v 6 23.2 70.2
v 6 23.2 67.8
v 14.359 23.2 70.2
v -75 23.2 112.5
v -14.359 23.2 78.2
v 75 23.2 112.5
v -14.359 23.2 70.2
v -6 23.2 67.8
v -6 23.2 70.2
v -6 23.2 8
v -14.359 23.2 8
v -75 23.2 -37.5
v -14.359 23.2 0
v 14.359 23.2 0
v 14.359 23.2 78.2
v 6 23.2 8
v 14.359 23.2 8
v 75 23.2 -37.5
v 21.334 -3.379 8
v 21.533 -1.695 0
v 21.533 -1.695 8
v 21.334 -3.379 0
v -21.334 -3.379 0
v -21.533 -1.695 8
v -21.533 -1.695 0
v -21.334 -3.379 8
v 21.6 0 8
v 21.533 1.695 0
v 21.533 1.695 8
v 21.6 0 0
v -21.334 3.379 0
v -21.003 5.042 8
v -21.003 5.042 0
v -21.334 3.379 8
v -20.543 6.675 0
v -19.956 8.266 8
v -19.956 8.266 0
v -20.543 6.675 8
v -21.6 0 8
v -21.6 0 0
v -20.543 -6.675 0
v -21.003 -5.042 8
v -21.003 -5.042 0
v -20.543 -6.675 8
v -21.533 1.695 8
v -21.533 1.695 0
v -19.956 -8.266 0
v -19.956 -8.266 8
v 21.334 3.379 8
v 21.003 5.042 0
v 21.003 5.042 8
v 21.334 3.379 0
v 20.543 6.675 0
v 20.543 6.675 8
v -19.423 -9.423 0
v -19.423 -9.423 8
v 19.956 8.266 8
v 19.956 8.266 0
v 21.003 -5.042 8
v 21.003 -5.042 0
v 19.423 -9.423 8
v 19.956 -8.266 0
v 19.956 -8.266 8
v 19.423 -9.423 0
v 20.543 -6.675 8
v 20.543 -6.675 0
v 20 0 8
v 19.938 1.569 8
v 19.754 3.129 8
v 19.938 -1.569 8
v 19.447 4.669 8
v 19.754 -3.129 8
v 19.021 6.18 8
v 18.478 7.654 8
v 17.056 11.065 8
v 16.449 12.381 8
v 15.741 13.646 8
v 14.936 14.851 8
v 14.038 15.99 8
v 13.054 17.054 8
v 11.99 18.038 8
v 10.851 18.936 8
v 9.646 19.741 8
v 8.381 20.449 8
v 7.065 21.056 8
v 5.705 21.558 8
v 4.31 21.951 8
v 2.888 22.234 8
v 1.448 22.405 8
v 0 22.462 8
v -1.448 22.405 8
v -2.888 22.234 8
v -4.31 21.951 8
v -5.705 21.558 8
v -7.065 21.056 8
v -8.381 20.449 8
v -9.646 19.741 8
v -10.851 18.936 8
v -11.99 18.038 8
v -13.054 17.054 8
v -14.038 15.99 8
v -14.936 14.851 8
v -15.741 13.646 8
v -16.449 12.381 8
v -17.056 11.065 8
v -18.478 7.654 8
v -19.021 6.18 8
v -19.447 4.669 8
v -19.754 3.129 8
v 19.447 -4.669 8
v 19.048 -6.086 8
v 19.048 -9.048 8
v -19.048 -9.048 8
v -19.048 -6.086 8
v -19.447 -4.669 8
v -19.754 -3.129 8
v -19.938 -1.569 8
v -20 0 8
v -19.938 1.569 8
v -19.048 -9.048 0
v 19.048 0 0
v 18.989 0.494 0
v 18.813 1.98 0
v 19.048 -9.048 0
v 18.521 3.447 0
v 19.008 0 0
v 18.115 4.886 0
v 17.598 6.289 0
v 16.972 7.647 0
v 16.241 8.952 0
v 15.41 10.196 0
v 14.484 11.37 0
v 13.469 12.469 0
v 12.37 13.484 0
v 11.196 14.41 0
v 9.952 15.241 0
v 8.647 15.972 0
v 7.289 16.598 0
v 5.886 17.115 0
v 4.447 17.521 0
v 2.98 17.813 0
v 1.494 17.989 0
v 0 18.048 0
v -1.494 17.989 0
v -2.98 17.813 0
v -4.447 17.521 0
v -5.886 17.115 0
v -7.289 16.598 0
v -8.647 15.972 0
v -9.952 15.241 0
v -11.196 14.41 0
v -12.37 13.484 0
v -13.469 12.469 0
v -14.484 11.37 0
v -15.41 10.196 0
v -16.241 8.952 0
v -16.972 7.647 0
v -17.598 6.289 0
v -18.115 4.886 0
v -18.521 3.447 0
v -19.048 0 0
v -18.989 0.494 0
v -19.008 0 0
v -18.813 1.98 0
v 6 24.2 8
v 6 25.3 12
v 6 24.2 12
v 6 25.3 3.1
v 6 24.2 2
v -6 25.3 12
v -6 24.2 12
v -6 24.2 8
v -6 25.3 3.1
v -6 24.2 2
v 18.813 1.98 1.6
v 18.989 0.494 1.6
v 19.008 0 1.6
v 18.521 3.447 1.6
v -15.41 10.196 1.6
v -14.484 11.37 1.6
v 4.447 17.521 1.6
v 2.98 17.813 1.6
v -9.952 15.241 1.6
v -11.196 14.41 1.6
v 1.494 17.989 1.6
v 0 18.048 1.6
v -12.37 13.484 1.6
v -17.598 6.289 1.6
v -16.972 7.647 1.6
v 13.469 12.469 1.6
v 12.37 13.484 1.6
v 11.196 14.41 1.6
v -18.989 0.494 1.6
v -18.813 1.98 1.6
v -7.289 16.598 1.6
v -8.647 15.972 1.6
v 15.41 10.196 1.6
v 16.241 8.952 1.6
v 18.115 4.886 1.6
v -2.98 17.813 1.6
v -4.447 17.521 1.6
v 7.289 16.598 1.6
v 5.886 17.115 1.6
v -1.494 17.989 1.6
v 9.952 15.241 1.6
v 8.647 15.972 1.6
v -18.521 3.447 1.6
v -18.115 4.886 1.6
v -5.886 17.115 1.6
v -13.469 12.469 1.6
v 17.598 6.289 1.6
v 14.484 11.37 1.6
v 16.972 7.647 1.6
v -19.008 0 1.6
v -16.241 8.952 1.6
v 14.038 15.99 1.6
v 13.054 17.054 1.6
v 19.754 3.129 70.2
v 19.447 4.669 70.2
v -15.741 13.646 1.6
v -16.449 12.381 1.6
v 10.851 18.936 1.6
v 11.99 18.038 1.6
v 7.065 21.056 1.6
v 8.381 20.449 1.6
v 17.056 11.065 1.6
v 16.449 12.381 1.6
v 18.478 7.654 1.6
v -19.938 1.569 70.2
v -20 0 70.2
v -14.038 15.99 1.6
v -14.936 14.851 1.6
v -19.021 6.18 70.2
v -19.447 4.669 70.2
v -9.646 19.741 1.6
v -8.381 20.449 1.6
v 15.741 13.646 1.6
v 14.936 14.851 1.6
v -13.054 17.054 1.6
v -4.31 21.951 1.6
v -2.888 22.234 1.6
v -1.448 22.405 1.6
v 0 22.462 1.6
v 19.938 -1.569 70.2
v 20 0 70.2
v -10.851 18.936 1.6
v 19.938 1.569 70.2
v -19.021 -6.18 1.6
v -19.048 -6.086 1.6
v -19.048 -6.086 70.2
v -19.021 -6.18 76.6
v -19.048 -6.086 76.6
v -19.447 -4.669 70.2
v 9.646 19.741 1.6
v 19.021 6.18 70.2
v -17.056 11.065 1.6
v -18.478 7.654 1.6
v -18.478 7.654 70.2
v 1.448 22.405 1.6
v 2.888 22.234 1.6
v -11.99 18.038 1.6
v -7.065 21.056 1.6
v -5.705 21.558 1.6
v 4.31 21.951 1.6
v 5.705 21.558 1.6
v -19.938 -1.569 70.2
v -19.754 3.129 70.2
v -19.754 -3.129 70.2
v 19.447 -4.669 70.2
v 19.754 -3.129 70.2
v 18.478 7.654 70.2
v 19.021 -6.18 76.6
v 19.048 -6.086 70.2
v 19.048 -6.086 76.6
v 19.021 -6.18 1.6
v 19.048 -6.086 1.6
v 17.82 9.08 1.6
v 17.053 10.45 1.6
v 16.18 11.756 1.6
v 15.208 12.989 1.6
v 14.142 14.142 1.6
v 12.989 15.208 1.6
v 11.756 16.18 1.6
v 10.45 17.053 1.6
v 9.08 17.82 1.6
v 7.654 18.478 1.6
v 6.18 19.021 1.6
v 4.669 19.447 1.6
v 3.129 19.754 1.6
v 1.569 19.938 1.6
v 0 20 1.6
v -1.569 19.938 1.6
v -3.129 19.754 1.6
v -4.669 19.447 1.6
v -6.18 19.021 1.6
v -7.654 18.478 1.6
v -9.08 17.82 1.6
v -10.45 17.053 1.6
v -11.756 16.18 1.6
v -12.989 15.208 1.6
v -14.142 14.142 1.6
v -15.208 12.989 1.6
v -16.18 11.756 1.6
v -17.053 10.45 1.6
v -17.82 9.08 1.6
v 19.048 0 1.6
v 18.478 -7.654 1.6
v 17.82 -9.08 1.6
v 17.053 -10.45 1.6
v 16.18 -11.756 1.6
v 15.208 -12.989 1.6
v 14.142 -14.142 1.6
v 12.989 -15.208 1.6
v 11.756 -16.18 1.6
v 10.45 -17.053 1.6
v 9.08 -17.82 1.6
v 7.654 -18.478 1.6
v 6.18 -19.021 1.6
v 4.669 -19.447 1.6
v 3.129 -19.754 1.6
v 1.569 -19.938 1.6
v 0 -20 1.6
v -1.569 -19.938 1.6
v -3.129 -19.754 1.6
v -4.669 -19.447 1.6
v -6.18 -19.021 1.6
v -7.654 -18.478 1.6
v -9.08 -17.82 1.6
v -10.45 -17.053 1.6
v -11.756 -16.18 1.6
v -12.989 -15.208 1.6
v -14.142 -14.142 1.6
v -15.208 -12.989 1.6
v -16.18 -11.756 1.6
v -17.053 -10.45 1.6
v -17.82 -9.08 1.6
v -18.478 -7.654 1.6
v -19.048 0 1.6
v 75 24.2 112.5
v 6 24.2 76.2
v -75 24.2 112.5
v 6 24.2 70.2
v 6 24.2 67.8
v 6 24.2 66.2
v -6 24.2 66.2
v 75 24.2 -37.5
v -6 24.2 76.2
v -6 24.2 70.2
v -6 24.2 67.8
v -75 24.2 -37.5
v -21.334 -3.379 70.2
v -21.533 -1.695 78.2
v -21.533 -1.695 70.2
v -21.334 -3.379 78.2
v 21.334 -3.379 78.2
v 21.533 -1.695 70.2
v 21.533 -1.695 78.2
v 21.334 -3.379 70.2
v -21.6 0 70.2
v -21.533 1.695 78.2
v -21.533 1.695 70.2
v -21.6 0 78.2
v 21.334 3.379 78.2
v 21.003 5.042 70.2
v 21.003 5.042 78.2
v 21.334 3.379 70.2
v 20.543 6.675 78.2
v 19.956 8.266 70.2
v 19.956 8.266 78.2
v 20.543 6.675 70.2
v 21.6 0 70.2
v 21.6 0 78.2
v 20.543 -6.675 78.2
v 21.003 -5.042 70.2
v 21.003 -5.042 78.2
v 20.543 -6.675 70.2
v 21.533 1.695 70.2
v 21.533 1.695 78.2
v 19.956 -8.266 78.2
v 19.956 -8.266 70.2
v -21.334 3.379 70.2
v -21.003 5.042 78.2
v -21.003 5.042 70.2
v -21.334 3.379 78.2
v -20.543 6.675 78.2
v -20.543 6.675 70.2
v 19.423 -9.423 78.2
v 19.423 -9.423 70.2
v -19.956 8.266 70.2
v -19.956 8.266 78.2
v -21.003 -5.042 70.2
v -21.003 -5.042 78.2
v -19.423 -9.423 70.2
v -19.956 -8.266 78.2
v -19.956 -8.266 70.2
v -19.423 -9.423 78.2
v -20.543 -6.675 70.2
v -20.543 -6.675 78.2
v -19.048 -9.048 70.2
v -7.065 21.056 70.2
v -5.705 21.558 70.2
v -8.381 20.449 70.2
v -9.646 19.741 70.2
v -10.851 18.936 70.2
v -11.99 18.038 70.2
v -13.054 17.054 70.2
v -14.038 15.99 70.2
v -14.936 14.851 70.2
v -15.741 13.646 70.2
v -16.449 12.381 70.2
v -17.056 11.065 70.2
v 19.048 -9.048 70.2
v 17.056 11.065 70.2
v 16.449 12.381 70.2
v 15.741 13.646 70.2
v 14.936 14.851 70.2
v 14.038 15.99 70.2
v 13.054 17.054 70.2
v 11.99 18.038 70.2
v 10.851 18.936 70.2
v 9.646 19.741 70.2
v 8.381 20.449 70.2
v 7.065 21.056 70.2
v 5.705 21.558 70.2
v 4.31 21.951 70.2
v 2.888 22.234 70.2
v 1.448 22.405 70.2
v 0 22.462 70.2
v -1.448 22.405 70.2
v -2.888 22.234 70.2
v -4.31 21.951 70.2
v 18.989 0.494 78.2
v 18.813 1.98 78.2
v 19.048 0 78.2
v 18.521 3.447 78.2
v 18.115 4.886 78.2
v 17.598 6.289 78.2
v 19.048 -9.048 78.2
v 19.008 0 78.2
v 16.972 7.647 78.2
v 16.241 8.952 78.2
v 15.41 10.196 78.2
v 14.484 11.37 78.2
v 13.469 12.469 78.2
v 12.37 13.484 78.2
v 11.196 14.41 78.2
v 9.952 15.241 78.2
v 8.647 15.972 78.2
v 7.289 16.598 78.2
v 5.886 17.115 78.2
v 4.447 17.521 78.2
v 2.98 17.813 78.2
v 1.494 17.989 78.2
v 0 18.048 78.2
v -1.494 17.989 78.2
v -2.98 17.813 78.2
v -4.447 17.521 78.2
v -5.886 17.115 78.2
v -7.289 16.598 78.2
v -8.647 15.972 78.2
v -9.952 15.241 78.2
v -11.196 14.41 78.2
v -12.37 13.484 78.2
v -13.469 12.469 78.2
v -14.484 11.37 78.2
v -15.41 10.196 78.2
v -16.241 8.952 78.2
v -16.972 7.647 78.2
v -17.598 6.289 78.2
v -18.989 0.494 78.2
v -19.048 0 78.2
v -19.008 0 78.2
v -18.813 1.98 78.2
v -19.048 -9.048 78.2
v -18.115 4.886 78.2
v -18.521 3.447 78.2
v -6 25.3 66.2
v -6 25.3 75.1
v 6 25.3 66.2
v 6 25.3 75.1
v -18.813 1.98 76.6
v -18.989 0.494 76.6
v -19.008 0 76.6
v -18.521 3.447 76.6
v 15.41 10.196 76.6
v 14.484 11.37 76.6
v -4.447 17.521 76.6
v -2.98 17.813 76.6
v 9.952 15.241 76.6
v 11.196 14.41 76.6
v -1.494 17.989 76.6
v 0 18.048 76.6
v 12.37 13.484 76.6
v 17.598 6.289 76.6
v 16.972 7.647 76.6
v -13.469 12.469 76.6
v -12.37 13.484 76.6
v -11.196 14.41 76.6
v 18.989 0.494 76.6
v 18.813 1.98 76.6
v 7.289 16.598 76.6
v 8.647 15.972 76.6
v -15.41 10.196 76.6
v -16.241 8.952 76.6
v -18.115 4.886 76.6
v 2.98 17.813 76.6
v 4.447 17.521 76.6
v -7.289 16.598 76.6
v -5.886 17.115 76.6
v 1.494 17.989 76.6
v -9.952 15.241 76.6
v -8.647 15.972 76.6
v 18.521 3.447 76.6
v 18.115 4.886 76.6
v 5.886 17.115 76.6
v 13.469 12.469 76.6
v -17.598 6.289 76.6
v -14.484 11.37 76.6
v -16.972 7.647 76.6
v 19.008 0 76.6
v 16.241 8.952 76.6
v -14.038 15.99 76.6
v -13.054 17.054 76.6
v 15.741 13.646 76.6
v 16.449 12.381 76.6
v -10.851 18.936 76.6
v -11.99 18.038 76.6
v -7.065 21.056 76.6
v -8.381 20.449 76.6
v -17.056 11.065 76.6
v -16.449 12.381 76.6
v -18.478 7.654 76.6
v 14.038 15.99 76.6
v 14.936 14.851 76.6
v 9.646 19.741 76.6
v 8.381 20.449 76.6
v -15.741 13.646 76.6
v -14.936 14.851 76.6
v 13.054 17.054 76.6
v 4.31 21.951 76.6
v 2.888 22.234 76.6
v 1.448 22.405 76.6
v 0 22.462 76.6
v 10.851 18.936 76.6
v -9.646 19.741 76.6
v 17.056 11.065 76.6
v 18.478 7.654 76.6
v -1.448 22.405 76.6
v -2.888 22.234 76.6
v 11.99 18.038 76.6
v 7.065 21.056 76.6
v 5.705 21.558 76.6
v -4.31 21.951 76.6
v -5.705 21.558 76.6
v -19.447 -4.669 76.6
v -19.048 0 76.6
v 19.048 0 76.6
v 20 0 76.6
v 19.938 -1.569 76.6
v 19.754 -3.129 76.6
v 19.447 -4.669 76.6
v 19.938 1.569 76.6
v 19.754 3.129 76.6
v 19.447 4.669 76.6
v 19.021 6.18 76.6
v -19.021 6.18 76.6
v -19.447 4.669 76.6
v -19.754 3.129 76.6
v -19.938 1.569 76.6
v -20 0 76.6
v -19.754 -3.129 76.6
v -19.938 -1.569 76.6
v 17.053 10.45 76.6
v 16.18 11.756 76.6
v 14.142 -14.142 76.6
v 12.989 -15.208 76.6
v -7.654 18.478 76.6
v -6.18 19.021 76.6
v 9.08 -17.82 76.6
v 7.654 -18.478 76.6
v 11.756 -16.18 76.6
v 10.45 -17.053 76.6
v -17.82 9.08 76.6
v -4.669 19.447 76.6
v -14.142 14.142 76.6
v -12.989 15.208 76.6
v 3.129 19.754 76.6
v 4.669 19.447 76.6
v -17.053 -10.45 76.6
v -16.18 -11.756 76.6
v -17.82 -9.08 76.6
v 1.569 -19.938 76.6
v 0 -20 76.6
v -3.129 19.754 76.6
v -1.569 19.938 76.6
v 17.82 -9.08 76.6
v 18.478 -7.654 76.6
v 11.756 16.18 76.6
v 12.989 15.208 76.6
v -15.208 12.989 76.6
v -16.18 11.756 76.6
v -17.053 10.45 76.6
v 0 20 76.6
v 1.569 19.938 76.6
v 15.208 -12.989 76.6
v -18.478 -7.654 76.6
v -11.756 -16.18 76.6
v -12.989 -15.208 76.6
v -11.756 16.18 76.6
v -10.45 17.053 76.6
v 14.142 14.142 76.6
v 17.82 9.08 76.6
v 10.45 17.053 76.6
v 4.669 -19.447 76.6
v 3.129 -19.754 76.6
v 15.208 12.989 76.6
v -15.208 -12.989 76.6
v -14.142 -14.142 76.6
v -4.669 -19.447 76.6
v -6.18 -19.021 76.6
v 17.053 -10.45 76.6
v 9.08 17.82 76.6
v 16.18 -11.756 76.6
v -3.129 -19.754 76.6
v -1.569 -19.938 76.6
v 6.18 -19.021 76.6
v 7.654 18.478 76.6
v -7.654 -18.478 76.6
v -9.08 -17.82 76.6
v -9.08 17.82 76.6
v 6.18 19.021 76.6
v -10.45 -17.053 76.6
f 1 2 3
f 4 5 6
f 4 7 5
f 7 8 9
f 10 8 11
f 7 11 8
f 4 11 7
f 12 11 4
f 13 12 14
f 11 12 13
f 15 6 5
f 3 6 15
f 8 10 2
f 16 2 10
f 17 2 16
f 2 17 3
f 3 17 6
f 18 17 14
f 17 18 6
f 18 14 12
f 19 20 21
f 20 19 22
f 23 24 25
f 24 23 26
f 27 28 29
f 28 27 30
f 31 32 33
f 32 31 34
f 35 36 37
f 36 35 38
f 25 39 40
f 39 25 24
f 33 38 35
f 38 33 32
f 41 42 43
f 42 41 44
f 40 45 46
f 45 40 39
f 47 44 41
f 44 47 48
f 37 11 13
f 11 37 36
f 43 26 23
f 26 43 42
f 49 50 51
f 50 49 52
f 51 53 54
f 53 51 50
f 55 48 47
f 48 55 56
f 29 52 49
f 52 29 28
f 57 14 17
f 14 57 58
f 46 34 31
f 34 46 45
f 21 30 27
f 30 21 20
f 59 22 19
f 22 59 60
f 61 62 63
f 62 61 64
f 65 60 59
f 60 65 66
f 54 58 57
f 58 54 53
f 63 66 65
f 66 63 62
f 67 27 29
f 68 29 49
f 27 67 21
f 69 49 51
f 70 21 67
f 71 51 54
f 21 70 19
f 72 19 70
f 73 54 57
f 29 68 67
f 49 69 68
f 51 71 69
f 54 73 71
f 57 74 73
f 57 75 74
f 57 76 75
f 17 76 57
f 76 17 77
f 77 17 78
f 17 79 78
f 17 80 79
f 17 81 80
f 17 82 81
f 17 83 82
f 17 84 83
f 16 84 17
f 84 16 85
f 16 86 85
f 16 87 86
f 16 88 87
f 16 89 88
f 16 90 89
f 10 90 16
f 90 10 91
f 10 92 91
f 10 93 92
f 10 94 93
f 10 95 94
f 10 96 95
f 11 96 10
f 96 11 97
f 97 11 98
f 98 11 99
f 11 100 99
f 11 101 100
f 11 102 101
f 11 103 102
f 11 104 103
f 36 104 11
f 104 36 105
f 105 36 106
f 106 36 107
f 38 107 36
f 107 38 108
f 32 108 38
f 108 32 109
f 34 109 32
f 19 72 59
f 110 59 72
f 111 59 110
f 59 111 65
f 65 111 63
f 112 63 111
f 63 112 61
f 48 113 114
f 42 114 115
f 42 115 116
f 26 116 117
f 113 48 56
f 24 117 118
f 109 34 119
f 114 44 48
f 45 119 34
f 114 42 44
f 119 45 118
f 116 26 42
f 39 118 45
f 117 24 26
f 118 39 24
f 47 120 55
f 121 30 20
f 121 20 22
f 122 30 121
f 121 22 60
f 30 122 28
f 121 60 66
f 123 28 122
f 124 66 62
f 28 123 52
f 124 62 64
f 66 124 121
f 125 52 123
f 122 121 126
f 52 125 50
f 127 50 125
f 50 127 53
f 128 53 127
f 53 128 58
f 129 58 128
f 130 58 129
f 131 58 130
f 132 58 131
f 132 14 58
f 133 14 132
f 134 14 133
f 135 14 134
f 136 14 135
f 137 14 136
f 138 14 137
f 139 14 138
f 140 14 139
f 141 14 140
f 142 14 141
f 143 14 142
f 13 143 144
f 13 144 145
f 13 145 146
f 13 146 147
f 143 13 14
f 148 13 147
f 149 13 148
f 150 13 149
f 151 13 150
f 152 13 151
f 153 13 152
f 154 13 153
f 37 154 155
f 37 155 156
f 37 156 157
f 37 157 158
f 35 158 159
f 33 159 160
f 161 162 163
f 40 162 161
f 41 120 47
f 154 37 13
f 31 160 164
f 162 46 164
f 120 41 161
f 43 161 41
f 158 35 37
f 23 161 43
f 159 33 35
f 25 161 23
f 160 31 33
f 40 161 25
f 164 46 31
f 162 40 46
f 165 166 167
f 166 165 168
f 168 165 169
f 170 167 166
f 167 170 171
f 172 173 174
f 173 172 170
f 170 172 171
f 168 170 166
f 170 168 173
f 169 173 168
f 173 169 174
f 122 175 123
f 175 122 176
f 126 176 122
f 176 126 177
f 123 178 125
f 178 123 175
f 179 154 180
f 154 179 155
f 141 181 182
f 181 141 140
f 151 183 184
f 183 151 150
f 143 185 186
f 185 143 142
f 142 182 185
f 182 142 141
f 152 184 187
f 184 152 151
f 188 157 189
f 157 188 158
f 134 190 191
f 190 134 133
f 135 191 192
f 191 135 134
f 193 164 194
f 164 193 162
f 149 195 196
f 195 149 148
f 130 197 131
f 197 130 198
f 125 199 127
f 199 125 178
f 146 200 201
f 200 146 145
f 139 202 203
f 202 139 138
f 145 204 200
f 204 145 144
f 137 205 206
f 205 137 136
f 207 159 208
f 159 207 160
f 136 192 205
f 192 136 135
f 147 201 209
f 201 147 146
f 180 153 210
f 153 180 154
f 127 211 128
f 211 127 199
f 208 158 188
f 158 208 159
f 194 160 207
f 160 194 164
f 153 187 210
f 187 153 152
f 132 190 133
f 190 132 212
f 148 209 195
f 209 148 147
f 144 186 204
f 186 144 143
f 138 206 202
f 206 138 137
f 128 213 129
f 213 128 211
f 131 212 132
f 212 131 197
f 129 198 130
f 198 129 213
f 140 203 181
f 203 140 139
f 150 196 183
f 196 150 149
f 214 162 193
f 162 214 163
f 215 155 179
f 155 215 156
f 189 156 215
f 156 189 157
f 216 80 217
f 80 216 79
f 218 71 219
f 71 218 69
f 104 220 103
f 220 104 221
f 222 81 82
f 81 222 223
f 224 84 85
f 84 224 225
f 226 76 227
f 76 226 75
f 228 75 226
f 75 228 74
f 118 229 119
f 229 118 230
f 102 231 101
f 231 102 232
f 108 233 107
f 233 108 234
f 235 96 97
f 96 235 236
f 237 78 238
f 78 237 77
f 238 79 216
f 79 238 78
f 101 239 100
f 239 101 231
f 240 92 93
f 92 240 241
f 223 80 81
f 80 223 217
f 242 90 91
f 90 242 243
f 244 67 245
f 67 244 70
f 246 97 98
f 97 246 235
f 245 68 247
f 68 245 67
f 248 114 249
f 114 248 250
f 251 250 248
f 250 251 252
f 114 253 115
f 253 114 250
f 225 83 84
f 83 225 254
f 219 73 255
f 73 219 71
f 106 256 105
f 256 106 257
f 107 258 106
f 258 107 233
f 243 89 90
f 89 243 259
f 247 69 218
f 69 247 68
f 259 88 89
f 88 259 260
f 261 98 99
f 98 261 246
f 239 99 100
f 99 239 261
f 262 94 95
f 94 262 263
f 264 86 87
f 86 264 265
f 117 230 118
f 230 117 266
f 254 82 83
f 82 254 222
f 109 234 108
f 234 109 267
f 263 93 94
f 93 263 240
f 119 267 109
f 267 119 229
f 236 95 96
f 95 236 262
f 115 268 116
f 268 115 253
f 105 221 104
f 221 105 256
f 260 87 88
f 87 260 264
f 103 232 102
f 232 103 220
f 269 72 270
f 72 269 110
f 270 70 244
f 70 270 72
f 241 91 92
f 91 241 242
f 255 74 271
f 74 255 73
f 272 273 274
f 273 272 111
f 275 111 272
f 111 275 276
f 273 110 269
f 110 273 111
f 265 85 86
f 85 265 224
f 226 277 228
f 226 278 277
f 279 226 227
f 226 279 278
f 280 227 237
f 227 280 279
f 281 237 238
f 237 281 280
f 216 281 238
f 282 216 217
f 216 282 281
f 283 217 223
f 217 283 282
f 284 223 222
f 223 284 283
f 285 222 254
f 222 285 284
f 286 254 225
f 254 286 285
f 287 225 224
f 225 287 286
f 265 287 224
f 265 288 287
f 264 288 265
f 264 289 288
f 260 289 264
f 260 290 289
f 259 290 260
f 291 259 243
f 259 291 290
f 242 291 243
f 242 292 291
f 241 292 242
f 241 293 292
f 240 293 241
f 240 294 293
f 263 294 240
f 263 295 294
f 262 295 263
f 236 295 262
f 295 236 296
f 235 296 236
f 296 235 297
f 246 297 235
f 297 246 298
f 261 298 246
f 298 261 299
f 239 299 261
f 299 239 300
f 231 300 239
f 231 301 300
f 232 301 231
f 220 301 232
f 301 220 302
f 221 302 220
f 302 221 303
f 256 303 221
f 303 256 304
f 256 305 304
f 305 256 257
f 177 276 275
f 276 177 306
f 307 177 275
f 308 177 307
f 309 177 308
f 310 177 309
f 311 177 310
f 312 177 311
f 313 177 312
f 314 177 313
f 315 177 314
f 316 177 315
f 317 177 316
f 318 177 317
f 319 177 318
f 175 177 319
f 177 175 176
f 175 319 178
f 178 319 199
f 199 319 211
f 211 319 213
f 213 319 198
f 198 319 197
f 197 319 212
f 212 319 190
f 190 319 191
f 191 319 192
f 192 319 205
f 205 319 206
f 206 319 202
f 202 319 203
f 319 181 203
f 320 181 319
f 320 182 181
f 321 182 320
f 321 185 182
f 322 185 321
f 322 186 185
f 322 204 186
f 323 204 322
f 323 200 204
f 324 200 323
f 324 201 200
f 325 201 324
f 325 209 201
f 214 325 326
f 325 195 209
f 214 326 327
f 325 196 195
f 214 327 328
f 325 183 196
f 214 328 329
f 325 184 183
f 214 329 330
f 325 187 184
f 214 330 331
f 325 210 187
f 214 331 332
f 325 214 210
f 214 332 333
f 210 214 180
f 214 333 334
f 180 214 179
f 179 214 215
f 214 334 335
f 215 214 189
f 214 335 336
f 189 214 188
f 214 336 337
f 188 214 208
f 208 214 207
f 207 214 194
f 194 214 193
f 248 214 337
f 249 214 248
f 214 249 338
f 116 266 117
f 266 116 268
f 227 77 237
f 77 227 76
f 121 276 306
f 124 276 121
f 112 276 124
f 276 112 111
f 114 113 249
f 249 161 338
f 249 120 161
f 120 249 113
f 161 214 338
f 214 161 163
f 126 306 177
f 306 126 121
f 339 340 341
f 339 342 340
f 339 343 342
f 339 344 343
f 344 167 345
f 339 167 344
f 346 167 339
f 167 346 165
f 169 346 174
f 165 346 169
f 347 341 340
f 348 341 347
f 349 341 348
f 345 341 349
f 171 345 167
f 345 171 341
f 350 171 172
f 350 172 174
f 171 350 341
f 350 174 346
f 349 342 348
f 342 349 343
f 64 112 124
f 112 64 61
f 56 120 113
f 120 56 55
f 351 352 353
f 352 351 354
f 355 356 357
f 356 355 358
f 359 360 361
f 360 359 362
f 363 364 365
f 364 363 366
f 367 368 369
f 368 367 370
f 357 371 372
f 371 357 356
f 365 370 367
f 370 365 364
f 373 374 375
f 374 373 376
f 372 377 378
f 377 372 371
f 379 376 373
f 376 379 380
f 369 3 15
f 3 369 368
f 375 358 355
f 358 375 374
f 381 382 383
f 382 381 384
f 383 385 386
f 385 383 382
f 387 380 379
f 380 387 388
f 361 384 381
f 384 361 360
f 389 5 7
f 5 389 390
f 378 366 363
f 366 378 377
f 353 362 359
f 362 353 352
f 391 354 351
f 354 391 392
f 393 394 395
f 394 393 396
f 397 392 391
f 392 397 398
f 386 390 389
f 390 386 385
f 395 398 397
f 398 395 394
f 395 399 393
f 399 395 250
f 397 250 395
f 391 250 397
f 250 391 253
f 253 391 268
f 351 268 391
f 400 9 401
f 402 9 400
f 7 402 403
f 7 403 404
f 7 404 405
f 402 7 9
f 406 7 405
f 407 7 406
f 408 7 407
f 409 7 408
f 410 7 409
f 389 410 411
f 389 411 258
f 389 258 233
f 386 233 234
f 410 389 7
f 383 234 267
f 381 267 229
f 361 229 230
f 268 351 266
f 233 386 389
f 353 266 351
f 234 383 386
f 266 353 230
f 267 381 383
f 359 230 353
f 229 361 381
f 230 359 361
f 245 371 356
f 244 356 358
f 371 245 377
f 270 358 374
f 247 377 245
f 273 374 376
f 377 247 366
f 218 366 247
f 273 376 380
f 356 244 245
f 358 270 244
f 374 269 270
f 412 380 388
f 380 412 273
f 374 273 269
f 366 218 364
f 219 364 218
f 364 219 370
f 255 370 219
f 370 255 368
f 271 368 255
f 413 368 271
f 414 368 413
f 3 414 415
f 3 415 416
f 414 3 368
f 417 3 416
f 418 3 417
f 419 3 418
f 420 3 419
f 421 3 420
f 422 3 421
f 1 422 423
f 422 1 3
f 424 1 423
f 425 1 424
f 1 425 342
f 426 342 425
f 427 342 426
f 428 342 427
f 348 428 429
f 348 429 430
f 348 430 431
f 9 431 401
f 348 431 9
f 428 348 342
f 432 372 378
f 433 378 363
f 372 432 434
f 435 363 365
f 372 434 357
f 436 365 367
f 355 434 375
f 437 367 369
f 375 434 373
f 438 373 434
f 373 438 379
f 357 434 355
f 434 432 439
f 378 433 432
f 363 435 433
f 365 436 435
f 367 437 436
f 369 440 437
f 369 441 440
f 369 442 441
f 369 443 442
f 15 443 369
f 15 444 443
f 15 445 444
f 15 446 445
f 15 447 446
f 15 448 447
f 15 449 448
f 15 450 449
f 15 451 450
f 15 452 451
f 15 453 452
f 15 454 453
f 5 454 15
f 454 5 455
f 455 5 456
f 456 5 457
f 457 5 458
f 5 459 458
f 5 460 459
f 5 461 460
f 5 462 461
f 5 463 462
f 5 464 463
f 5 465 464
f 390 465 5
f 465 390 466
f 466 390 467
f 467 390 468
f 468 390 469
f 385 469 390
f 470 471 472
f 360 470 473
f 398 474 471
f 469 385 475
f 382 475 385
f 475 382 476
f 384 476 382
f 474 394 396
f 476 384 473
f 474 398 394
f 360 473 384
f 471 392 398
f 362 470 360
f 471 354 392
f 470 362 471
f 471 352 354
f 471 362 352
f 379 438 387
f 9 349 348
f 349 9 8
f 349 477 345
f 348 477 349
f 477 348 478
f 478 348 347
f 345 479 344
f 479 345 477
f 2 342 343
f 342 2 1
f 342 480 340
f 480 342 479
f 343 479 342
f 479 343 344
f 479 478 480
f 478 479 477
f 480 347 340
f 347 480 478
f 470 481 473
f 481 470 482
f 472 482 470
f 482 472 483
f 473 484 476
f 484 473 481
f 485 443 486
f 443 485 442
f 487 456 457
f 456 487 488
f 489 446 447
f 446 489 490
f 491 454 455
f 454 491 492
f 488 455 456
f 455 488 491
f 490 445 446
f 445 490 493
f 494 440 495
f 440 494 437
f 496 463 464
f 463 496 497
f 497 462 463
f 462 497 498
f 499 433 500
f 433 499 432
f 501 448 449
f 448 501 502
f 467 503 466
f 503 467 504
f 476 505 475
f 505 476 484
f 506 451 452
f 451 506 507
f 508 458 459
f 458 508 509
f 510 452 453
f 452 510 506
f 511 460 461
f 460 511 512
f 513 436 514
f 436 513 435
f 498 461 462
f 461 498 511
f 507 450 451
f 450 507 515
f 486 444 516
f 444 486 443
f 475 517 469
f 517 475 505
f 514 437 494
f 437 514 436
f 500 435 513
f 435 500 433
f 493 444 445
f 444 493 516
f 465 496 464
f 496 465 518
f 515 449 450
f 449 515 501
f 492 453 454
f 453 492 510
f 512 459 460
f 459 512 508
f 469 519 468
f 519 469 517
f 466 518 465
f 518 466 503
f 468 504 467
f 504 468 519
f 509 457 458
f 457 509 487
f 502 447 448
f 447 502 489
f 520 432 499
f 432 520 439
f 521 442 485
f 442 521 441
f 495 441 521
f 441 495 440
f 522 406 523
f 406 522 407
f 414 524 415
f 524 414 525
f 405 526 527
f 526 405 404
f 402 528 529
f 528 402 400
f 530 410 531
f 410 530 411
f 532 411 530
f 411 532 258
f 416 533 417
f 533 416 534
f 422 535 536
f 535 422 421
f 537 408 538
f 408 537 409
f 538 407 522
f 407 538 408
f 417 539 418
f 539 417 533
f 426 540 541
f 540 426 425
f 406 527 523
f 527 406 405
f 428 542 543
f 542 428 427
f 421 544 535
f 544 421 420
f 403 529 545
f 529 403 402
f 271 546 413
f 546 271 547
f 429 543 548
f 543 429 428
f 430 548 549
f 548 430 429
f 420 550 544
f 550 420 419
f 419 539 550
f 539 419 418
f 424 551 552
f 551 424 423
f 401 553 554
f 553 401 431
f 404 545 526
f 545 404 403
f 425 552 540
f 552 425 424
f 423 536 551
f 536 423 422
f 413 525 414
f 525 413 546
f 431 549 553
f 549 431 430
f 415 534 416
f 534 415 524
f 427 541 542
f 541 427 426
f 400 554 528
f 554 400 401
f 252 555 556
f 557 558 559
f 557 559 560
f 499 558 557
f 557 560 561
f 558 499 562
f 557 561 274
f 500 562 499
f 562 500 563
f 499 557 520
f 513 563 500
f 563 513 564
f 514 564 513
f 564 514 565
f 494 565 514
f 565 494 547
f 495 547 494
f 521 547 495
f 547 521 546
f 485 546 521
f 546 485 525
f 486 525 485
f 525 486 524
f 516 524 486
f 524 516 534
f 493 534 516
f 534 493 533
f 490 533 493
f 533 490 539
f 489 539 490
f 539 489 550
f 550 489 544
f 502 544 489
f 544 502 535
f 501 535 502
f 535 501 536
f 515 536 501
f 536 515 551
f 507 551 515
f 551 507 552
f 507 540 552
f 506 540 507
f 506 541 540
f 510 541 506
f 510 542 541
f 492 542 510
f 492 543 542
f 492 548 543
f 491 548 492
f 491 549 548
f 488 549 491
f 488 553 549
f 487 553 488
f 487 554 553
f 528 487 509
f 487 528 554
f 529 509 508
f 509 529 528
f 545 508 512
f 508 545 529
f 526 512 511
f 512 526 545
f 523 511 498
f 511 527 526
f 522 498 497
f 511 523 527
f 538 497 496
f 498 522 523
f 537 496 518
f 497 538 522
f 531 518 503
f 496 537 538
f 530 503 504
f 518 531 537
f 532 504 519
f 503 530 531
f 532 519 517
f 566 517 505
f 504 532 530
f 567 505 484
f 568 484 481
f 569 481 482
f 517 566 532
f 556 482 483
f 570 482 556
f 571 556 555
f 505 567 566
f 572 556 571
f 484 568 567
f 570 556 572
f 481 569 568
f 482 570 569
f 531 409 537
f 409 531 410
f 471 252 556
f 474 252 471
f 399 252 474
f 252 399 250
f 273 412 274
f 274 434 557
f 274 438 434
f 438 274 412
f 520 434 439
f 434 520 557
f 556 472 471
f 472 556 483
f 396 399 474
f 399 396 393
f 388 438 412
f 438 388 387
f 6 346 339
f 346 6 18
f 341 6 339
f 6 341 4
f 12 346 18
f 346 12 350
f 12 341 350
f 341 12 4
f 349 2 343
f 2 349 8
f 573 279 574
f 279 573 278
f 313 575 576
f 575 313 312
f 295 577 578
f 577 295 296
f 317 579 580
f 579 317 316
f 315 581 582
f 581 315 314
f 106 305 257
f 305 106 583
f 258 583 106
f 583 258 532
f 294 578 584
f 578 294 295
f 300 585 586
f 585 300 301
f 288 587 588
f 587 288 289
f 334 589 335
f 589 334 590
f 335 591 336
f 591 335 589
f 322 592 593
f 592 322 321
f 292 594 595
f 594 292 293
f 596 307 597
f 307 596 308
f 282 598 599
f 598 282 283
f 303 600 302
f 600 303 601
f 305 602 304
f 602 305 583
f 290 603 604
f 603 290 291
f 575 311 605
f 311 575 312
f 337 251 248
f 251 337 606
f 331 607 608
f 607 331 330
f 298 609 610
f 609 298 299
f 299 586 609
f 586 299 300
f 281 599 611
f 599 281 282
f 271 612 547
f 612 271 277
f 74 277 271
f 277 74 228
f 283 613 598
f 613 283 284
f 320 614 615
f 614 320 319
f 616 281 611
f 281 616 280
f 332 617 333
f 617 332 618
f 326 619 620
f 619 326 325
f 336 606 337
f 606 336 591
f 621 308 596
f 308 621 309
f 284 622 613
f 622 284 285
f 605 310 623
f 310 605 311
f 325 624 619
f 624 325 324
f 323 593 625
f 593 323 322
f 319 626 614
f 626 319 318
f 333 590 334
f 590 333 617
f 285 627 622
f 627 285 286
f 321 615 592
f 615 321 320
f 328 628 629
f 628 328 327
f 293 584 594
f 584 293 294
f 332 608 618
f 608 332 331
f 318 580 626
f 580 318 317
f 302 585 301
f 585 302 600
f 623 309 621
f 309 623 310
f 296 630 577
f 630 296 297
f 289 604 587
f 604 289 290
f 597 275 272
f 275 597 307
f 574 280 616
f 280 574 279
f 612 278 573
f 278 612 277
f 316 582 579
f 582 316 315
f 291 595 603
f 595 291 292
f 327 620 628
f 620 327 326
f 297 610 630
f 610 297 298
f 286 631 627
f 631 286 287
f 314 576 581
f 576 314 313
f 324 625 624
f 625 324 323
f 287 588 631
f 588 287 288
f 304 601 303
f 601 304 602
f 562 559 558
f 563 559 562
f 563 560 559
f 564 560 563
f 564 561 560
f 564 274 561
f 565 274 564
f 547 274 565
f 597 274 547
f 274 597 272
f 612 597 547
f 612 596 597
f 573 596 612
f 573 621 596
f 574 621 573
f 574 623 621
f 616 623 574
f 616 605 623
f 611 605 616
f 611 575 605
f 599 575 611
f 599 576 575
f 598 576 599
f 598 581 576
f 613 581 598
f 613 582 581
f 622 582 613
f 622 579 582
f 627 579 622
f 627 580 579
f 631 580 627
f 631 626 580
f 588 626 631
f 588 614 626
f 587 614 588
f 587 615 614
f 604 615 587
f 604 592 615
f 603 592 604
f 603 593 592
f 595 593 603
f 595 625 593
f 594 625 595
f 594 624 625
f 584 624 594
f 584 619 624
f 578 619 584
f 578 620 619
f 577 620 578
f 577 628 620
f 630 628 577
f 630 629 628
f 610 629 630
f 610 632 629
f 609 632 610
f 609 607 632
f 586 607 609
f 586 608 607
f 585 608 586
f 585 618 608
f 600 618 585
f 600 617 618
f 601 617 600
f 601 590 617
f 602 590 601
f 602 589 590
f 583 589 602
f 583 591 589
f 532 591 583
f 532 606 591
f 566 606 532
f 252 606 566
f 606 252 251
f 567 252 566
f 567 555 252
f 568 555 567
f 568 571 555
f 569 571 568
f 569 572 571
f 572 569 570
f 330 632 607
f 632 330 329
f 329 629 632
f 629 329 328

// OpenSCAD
/*

Capacitor clamp script. Based on a clamp found in a Philips 1542 power supply, coded by Atkelar in 2022. Free to use in non-commercial manners, please consider putting a bit in my Ko-Fi account over here https://ko-fi.com/atkelar if you like it! Thanks!

Two equal clamps are needed. They are going to grip the capacitor and lock it in place when put into a square hole for each.

The "show use" option will print out measurements for the hole pattern, which can be seen as such:

    +--+            +--+ <----
    |  |            |  |     |
    |  |<-distance->|  |   width
    |  |            |  |     |
    +--+            +--+ <----
    ^--^ height
*/

/* [Tab] [Sizes] */

// Outer diameter of the capacitor, in mm.
dCapacitor = 40;

// Thickness (or height) of the clamp band, in mm.
hClamp = 8;

// Width of the tab for the mounting clip. Make sure the actual hole is ever so slightly larger!
wTab = 12;

// Height of the tab (hole) for the mounting clip. Make sure the actual hole is ever so slightly larger!
hTab = 6;

// Thickness of the sheet metal that holds the clip
hSheet = 1;

// Height of the capacitor in mm. used for visualization and hole computation.abs
hCapacitor = 75;


// Show the applied use; Read debug output for hole pattern description.
showUse = true;

/* [Tab] [Tuning (advanced)] */

// Percentage to "shrink" the clamp around the capacitor to provide "springiness". Default 2.5 will cause 39mm clamp for 40mm capacitor.
pSpring = 2.5; 

// Percentage for the standard wall thickness, measured against the height of the band.
pThickness = 20;

// Percentage for the "inset" or "lip" that will hold the capacitor and prevent sliding out. Measured against the capacitor diameter.
pInset = 5;

// resolution (higher = smoother, I go with 80 usually)
$fn=80; // [20:10:100]

module Holder(dmajor, hnorm, dinset, wwall, wtab, htab, hsheet, dminor, wback)
{
    difference()
    {
        union() // raw, full outline.
        {
            hull()
            {
                cylinder(h=hnorm, d=dmajor + 2*wwall);
                translate([-wback/2,2*wwall,0])
                    cube([wback, dmajor/2, hnorm]);
            }
            translate([-wtab / 2, dmajor/2 + wwall + hsheet,hnorm-htab])
                cube([wtab, wwall + hsheet + 0.1, 10]);
        }
        translate([-wtab / 2 *1.1, dmajor / 2 + wwall*2+hsheet, hnorm-hTab])
            rotate([-45,0,0])
                cube([14,5,5]);
        translate([0,-1,-0.5])
            cylinder(d=dinset, h=hnorm+1);
        translate([0,0,wwall])
            hull()
            {
                cylinder(d=dmajor, h=hnorm+1);
                translate([0,dmajor*0.1,0])
                    cylinder(d=dminor, h=hnorm+1);
            }
        translate([-dinset/2,-dmajor / 2,-.5])
            cube([dinset, dmajor / 2, hnorm+1]);
        translate([-(dmajor / 2 + wwall*1.1), -(dmajor / 2 - hSheet), hnorm])
            cube([dmajor+wwall*2.2,dmajor+wwall*2, hnorm]);
        translate([0,dmajor * 0.25,-0.5])
            rotate([0,0,-135])
                cube([dmajor,dmajor, hnorm+1]);
    }
}

module Sheet(width, height, thick, wtab, htab, yoffset, hnorm, dist)
{
    echo(str("Holes are supposed to be ", wtab, "mm wide and ", htab, "mm heigh, with an inner distance of ", dist, "mm"));
    
    
    difference()
    {
        translate([-width/2,yoffset ,-height/4]) // align the back end with 0 Y so the test-sheet can align easily.

            cube([width, thick, height]);
        translate([-wtab/2,yoffset-0.1,hnorm-htab])
            cube([wtab,thick+0.3,htab]);
        translate([-wtab/2,yoffset-0.1,hnorm+dist])
            cube([wtab,thick+0.3,htab]);
    }
}

dminor = dCapacitor * 0.923076923;
wback = dCapacitor * 0.717948718;

Holder(dCapacitor, hClamp, dCapacitor / (1+(pInset / 100)), hClamp * (pThickness / 100), wTab, hTab, hSheet, dminor, wback);

if (showUse)
{
    
    color("gray", 0.2)
    translate([0,0,hCapacitor + hClamp * (pThickness / 100)*2])
        rotate([0,180,0])
    Holder(dCapacitor, hClamp, dCapacitor / (1+(pInset / 100)), hClamp * (pThickness / 100), wTab, hTab, hSheet, dminor, wback);
    color("blue", 0.2)
        translate([0,0,hClamp * (pThickness / 100)])
            cylinder(d = dCapacitor, h = hCapacitor);

    color("white", 0.4)
        Sheet(hCapacitor*2, hCapacitor * 2, hSheet, wTab, hTab, dCapacitor / 2 + hClamp * (pThickness / 100) *2, hClamp, hCapacitor - hClamp * (pThickness / 100) * 2-hTab * 2  );
}
